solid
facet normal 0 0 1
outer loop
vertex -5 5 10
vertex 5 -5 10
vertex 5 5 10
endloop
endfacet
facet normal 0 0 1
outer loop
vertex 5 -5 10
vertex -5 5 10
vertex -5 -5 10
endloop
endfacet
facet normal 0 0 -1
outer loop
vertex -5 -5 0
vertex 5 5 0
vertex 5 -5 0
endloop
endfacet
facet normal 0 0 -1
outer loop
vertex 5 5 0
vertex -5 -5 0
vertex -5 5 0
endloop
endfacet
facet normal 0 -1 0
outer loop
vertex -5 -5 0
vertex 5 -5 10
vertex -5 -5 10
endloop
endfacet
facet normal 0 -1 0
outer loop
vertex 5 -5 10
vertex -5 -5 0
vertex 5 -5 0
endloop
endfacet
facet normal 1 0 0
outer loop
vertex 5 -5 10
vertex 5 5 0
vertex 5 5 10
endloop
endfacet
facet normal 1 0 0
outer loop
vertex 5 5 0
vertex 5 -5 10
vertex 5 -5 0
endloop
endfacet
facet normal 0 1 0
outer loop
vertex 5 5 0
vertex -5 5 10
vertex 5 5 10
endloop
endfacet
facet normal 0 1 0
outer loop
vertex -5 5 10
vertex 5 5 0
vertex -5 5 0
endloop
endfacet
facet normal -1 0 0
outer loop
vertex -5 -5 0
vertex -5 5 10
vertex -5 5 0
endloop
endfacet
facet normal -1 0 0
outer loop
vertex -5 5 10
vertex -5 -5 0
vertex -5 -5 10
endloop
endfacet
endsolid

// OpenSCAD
translate([-5, -5, 0])
cube(size=[10, 10, 10], center=false);
